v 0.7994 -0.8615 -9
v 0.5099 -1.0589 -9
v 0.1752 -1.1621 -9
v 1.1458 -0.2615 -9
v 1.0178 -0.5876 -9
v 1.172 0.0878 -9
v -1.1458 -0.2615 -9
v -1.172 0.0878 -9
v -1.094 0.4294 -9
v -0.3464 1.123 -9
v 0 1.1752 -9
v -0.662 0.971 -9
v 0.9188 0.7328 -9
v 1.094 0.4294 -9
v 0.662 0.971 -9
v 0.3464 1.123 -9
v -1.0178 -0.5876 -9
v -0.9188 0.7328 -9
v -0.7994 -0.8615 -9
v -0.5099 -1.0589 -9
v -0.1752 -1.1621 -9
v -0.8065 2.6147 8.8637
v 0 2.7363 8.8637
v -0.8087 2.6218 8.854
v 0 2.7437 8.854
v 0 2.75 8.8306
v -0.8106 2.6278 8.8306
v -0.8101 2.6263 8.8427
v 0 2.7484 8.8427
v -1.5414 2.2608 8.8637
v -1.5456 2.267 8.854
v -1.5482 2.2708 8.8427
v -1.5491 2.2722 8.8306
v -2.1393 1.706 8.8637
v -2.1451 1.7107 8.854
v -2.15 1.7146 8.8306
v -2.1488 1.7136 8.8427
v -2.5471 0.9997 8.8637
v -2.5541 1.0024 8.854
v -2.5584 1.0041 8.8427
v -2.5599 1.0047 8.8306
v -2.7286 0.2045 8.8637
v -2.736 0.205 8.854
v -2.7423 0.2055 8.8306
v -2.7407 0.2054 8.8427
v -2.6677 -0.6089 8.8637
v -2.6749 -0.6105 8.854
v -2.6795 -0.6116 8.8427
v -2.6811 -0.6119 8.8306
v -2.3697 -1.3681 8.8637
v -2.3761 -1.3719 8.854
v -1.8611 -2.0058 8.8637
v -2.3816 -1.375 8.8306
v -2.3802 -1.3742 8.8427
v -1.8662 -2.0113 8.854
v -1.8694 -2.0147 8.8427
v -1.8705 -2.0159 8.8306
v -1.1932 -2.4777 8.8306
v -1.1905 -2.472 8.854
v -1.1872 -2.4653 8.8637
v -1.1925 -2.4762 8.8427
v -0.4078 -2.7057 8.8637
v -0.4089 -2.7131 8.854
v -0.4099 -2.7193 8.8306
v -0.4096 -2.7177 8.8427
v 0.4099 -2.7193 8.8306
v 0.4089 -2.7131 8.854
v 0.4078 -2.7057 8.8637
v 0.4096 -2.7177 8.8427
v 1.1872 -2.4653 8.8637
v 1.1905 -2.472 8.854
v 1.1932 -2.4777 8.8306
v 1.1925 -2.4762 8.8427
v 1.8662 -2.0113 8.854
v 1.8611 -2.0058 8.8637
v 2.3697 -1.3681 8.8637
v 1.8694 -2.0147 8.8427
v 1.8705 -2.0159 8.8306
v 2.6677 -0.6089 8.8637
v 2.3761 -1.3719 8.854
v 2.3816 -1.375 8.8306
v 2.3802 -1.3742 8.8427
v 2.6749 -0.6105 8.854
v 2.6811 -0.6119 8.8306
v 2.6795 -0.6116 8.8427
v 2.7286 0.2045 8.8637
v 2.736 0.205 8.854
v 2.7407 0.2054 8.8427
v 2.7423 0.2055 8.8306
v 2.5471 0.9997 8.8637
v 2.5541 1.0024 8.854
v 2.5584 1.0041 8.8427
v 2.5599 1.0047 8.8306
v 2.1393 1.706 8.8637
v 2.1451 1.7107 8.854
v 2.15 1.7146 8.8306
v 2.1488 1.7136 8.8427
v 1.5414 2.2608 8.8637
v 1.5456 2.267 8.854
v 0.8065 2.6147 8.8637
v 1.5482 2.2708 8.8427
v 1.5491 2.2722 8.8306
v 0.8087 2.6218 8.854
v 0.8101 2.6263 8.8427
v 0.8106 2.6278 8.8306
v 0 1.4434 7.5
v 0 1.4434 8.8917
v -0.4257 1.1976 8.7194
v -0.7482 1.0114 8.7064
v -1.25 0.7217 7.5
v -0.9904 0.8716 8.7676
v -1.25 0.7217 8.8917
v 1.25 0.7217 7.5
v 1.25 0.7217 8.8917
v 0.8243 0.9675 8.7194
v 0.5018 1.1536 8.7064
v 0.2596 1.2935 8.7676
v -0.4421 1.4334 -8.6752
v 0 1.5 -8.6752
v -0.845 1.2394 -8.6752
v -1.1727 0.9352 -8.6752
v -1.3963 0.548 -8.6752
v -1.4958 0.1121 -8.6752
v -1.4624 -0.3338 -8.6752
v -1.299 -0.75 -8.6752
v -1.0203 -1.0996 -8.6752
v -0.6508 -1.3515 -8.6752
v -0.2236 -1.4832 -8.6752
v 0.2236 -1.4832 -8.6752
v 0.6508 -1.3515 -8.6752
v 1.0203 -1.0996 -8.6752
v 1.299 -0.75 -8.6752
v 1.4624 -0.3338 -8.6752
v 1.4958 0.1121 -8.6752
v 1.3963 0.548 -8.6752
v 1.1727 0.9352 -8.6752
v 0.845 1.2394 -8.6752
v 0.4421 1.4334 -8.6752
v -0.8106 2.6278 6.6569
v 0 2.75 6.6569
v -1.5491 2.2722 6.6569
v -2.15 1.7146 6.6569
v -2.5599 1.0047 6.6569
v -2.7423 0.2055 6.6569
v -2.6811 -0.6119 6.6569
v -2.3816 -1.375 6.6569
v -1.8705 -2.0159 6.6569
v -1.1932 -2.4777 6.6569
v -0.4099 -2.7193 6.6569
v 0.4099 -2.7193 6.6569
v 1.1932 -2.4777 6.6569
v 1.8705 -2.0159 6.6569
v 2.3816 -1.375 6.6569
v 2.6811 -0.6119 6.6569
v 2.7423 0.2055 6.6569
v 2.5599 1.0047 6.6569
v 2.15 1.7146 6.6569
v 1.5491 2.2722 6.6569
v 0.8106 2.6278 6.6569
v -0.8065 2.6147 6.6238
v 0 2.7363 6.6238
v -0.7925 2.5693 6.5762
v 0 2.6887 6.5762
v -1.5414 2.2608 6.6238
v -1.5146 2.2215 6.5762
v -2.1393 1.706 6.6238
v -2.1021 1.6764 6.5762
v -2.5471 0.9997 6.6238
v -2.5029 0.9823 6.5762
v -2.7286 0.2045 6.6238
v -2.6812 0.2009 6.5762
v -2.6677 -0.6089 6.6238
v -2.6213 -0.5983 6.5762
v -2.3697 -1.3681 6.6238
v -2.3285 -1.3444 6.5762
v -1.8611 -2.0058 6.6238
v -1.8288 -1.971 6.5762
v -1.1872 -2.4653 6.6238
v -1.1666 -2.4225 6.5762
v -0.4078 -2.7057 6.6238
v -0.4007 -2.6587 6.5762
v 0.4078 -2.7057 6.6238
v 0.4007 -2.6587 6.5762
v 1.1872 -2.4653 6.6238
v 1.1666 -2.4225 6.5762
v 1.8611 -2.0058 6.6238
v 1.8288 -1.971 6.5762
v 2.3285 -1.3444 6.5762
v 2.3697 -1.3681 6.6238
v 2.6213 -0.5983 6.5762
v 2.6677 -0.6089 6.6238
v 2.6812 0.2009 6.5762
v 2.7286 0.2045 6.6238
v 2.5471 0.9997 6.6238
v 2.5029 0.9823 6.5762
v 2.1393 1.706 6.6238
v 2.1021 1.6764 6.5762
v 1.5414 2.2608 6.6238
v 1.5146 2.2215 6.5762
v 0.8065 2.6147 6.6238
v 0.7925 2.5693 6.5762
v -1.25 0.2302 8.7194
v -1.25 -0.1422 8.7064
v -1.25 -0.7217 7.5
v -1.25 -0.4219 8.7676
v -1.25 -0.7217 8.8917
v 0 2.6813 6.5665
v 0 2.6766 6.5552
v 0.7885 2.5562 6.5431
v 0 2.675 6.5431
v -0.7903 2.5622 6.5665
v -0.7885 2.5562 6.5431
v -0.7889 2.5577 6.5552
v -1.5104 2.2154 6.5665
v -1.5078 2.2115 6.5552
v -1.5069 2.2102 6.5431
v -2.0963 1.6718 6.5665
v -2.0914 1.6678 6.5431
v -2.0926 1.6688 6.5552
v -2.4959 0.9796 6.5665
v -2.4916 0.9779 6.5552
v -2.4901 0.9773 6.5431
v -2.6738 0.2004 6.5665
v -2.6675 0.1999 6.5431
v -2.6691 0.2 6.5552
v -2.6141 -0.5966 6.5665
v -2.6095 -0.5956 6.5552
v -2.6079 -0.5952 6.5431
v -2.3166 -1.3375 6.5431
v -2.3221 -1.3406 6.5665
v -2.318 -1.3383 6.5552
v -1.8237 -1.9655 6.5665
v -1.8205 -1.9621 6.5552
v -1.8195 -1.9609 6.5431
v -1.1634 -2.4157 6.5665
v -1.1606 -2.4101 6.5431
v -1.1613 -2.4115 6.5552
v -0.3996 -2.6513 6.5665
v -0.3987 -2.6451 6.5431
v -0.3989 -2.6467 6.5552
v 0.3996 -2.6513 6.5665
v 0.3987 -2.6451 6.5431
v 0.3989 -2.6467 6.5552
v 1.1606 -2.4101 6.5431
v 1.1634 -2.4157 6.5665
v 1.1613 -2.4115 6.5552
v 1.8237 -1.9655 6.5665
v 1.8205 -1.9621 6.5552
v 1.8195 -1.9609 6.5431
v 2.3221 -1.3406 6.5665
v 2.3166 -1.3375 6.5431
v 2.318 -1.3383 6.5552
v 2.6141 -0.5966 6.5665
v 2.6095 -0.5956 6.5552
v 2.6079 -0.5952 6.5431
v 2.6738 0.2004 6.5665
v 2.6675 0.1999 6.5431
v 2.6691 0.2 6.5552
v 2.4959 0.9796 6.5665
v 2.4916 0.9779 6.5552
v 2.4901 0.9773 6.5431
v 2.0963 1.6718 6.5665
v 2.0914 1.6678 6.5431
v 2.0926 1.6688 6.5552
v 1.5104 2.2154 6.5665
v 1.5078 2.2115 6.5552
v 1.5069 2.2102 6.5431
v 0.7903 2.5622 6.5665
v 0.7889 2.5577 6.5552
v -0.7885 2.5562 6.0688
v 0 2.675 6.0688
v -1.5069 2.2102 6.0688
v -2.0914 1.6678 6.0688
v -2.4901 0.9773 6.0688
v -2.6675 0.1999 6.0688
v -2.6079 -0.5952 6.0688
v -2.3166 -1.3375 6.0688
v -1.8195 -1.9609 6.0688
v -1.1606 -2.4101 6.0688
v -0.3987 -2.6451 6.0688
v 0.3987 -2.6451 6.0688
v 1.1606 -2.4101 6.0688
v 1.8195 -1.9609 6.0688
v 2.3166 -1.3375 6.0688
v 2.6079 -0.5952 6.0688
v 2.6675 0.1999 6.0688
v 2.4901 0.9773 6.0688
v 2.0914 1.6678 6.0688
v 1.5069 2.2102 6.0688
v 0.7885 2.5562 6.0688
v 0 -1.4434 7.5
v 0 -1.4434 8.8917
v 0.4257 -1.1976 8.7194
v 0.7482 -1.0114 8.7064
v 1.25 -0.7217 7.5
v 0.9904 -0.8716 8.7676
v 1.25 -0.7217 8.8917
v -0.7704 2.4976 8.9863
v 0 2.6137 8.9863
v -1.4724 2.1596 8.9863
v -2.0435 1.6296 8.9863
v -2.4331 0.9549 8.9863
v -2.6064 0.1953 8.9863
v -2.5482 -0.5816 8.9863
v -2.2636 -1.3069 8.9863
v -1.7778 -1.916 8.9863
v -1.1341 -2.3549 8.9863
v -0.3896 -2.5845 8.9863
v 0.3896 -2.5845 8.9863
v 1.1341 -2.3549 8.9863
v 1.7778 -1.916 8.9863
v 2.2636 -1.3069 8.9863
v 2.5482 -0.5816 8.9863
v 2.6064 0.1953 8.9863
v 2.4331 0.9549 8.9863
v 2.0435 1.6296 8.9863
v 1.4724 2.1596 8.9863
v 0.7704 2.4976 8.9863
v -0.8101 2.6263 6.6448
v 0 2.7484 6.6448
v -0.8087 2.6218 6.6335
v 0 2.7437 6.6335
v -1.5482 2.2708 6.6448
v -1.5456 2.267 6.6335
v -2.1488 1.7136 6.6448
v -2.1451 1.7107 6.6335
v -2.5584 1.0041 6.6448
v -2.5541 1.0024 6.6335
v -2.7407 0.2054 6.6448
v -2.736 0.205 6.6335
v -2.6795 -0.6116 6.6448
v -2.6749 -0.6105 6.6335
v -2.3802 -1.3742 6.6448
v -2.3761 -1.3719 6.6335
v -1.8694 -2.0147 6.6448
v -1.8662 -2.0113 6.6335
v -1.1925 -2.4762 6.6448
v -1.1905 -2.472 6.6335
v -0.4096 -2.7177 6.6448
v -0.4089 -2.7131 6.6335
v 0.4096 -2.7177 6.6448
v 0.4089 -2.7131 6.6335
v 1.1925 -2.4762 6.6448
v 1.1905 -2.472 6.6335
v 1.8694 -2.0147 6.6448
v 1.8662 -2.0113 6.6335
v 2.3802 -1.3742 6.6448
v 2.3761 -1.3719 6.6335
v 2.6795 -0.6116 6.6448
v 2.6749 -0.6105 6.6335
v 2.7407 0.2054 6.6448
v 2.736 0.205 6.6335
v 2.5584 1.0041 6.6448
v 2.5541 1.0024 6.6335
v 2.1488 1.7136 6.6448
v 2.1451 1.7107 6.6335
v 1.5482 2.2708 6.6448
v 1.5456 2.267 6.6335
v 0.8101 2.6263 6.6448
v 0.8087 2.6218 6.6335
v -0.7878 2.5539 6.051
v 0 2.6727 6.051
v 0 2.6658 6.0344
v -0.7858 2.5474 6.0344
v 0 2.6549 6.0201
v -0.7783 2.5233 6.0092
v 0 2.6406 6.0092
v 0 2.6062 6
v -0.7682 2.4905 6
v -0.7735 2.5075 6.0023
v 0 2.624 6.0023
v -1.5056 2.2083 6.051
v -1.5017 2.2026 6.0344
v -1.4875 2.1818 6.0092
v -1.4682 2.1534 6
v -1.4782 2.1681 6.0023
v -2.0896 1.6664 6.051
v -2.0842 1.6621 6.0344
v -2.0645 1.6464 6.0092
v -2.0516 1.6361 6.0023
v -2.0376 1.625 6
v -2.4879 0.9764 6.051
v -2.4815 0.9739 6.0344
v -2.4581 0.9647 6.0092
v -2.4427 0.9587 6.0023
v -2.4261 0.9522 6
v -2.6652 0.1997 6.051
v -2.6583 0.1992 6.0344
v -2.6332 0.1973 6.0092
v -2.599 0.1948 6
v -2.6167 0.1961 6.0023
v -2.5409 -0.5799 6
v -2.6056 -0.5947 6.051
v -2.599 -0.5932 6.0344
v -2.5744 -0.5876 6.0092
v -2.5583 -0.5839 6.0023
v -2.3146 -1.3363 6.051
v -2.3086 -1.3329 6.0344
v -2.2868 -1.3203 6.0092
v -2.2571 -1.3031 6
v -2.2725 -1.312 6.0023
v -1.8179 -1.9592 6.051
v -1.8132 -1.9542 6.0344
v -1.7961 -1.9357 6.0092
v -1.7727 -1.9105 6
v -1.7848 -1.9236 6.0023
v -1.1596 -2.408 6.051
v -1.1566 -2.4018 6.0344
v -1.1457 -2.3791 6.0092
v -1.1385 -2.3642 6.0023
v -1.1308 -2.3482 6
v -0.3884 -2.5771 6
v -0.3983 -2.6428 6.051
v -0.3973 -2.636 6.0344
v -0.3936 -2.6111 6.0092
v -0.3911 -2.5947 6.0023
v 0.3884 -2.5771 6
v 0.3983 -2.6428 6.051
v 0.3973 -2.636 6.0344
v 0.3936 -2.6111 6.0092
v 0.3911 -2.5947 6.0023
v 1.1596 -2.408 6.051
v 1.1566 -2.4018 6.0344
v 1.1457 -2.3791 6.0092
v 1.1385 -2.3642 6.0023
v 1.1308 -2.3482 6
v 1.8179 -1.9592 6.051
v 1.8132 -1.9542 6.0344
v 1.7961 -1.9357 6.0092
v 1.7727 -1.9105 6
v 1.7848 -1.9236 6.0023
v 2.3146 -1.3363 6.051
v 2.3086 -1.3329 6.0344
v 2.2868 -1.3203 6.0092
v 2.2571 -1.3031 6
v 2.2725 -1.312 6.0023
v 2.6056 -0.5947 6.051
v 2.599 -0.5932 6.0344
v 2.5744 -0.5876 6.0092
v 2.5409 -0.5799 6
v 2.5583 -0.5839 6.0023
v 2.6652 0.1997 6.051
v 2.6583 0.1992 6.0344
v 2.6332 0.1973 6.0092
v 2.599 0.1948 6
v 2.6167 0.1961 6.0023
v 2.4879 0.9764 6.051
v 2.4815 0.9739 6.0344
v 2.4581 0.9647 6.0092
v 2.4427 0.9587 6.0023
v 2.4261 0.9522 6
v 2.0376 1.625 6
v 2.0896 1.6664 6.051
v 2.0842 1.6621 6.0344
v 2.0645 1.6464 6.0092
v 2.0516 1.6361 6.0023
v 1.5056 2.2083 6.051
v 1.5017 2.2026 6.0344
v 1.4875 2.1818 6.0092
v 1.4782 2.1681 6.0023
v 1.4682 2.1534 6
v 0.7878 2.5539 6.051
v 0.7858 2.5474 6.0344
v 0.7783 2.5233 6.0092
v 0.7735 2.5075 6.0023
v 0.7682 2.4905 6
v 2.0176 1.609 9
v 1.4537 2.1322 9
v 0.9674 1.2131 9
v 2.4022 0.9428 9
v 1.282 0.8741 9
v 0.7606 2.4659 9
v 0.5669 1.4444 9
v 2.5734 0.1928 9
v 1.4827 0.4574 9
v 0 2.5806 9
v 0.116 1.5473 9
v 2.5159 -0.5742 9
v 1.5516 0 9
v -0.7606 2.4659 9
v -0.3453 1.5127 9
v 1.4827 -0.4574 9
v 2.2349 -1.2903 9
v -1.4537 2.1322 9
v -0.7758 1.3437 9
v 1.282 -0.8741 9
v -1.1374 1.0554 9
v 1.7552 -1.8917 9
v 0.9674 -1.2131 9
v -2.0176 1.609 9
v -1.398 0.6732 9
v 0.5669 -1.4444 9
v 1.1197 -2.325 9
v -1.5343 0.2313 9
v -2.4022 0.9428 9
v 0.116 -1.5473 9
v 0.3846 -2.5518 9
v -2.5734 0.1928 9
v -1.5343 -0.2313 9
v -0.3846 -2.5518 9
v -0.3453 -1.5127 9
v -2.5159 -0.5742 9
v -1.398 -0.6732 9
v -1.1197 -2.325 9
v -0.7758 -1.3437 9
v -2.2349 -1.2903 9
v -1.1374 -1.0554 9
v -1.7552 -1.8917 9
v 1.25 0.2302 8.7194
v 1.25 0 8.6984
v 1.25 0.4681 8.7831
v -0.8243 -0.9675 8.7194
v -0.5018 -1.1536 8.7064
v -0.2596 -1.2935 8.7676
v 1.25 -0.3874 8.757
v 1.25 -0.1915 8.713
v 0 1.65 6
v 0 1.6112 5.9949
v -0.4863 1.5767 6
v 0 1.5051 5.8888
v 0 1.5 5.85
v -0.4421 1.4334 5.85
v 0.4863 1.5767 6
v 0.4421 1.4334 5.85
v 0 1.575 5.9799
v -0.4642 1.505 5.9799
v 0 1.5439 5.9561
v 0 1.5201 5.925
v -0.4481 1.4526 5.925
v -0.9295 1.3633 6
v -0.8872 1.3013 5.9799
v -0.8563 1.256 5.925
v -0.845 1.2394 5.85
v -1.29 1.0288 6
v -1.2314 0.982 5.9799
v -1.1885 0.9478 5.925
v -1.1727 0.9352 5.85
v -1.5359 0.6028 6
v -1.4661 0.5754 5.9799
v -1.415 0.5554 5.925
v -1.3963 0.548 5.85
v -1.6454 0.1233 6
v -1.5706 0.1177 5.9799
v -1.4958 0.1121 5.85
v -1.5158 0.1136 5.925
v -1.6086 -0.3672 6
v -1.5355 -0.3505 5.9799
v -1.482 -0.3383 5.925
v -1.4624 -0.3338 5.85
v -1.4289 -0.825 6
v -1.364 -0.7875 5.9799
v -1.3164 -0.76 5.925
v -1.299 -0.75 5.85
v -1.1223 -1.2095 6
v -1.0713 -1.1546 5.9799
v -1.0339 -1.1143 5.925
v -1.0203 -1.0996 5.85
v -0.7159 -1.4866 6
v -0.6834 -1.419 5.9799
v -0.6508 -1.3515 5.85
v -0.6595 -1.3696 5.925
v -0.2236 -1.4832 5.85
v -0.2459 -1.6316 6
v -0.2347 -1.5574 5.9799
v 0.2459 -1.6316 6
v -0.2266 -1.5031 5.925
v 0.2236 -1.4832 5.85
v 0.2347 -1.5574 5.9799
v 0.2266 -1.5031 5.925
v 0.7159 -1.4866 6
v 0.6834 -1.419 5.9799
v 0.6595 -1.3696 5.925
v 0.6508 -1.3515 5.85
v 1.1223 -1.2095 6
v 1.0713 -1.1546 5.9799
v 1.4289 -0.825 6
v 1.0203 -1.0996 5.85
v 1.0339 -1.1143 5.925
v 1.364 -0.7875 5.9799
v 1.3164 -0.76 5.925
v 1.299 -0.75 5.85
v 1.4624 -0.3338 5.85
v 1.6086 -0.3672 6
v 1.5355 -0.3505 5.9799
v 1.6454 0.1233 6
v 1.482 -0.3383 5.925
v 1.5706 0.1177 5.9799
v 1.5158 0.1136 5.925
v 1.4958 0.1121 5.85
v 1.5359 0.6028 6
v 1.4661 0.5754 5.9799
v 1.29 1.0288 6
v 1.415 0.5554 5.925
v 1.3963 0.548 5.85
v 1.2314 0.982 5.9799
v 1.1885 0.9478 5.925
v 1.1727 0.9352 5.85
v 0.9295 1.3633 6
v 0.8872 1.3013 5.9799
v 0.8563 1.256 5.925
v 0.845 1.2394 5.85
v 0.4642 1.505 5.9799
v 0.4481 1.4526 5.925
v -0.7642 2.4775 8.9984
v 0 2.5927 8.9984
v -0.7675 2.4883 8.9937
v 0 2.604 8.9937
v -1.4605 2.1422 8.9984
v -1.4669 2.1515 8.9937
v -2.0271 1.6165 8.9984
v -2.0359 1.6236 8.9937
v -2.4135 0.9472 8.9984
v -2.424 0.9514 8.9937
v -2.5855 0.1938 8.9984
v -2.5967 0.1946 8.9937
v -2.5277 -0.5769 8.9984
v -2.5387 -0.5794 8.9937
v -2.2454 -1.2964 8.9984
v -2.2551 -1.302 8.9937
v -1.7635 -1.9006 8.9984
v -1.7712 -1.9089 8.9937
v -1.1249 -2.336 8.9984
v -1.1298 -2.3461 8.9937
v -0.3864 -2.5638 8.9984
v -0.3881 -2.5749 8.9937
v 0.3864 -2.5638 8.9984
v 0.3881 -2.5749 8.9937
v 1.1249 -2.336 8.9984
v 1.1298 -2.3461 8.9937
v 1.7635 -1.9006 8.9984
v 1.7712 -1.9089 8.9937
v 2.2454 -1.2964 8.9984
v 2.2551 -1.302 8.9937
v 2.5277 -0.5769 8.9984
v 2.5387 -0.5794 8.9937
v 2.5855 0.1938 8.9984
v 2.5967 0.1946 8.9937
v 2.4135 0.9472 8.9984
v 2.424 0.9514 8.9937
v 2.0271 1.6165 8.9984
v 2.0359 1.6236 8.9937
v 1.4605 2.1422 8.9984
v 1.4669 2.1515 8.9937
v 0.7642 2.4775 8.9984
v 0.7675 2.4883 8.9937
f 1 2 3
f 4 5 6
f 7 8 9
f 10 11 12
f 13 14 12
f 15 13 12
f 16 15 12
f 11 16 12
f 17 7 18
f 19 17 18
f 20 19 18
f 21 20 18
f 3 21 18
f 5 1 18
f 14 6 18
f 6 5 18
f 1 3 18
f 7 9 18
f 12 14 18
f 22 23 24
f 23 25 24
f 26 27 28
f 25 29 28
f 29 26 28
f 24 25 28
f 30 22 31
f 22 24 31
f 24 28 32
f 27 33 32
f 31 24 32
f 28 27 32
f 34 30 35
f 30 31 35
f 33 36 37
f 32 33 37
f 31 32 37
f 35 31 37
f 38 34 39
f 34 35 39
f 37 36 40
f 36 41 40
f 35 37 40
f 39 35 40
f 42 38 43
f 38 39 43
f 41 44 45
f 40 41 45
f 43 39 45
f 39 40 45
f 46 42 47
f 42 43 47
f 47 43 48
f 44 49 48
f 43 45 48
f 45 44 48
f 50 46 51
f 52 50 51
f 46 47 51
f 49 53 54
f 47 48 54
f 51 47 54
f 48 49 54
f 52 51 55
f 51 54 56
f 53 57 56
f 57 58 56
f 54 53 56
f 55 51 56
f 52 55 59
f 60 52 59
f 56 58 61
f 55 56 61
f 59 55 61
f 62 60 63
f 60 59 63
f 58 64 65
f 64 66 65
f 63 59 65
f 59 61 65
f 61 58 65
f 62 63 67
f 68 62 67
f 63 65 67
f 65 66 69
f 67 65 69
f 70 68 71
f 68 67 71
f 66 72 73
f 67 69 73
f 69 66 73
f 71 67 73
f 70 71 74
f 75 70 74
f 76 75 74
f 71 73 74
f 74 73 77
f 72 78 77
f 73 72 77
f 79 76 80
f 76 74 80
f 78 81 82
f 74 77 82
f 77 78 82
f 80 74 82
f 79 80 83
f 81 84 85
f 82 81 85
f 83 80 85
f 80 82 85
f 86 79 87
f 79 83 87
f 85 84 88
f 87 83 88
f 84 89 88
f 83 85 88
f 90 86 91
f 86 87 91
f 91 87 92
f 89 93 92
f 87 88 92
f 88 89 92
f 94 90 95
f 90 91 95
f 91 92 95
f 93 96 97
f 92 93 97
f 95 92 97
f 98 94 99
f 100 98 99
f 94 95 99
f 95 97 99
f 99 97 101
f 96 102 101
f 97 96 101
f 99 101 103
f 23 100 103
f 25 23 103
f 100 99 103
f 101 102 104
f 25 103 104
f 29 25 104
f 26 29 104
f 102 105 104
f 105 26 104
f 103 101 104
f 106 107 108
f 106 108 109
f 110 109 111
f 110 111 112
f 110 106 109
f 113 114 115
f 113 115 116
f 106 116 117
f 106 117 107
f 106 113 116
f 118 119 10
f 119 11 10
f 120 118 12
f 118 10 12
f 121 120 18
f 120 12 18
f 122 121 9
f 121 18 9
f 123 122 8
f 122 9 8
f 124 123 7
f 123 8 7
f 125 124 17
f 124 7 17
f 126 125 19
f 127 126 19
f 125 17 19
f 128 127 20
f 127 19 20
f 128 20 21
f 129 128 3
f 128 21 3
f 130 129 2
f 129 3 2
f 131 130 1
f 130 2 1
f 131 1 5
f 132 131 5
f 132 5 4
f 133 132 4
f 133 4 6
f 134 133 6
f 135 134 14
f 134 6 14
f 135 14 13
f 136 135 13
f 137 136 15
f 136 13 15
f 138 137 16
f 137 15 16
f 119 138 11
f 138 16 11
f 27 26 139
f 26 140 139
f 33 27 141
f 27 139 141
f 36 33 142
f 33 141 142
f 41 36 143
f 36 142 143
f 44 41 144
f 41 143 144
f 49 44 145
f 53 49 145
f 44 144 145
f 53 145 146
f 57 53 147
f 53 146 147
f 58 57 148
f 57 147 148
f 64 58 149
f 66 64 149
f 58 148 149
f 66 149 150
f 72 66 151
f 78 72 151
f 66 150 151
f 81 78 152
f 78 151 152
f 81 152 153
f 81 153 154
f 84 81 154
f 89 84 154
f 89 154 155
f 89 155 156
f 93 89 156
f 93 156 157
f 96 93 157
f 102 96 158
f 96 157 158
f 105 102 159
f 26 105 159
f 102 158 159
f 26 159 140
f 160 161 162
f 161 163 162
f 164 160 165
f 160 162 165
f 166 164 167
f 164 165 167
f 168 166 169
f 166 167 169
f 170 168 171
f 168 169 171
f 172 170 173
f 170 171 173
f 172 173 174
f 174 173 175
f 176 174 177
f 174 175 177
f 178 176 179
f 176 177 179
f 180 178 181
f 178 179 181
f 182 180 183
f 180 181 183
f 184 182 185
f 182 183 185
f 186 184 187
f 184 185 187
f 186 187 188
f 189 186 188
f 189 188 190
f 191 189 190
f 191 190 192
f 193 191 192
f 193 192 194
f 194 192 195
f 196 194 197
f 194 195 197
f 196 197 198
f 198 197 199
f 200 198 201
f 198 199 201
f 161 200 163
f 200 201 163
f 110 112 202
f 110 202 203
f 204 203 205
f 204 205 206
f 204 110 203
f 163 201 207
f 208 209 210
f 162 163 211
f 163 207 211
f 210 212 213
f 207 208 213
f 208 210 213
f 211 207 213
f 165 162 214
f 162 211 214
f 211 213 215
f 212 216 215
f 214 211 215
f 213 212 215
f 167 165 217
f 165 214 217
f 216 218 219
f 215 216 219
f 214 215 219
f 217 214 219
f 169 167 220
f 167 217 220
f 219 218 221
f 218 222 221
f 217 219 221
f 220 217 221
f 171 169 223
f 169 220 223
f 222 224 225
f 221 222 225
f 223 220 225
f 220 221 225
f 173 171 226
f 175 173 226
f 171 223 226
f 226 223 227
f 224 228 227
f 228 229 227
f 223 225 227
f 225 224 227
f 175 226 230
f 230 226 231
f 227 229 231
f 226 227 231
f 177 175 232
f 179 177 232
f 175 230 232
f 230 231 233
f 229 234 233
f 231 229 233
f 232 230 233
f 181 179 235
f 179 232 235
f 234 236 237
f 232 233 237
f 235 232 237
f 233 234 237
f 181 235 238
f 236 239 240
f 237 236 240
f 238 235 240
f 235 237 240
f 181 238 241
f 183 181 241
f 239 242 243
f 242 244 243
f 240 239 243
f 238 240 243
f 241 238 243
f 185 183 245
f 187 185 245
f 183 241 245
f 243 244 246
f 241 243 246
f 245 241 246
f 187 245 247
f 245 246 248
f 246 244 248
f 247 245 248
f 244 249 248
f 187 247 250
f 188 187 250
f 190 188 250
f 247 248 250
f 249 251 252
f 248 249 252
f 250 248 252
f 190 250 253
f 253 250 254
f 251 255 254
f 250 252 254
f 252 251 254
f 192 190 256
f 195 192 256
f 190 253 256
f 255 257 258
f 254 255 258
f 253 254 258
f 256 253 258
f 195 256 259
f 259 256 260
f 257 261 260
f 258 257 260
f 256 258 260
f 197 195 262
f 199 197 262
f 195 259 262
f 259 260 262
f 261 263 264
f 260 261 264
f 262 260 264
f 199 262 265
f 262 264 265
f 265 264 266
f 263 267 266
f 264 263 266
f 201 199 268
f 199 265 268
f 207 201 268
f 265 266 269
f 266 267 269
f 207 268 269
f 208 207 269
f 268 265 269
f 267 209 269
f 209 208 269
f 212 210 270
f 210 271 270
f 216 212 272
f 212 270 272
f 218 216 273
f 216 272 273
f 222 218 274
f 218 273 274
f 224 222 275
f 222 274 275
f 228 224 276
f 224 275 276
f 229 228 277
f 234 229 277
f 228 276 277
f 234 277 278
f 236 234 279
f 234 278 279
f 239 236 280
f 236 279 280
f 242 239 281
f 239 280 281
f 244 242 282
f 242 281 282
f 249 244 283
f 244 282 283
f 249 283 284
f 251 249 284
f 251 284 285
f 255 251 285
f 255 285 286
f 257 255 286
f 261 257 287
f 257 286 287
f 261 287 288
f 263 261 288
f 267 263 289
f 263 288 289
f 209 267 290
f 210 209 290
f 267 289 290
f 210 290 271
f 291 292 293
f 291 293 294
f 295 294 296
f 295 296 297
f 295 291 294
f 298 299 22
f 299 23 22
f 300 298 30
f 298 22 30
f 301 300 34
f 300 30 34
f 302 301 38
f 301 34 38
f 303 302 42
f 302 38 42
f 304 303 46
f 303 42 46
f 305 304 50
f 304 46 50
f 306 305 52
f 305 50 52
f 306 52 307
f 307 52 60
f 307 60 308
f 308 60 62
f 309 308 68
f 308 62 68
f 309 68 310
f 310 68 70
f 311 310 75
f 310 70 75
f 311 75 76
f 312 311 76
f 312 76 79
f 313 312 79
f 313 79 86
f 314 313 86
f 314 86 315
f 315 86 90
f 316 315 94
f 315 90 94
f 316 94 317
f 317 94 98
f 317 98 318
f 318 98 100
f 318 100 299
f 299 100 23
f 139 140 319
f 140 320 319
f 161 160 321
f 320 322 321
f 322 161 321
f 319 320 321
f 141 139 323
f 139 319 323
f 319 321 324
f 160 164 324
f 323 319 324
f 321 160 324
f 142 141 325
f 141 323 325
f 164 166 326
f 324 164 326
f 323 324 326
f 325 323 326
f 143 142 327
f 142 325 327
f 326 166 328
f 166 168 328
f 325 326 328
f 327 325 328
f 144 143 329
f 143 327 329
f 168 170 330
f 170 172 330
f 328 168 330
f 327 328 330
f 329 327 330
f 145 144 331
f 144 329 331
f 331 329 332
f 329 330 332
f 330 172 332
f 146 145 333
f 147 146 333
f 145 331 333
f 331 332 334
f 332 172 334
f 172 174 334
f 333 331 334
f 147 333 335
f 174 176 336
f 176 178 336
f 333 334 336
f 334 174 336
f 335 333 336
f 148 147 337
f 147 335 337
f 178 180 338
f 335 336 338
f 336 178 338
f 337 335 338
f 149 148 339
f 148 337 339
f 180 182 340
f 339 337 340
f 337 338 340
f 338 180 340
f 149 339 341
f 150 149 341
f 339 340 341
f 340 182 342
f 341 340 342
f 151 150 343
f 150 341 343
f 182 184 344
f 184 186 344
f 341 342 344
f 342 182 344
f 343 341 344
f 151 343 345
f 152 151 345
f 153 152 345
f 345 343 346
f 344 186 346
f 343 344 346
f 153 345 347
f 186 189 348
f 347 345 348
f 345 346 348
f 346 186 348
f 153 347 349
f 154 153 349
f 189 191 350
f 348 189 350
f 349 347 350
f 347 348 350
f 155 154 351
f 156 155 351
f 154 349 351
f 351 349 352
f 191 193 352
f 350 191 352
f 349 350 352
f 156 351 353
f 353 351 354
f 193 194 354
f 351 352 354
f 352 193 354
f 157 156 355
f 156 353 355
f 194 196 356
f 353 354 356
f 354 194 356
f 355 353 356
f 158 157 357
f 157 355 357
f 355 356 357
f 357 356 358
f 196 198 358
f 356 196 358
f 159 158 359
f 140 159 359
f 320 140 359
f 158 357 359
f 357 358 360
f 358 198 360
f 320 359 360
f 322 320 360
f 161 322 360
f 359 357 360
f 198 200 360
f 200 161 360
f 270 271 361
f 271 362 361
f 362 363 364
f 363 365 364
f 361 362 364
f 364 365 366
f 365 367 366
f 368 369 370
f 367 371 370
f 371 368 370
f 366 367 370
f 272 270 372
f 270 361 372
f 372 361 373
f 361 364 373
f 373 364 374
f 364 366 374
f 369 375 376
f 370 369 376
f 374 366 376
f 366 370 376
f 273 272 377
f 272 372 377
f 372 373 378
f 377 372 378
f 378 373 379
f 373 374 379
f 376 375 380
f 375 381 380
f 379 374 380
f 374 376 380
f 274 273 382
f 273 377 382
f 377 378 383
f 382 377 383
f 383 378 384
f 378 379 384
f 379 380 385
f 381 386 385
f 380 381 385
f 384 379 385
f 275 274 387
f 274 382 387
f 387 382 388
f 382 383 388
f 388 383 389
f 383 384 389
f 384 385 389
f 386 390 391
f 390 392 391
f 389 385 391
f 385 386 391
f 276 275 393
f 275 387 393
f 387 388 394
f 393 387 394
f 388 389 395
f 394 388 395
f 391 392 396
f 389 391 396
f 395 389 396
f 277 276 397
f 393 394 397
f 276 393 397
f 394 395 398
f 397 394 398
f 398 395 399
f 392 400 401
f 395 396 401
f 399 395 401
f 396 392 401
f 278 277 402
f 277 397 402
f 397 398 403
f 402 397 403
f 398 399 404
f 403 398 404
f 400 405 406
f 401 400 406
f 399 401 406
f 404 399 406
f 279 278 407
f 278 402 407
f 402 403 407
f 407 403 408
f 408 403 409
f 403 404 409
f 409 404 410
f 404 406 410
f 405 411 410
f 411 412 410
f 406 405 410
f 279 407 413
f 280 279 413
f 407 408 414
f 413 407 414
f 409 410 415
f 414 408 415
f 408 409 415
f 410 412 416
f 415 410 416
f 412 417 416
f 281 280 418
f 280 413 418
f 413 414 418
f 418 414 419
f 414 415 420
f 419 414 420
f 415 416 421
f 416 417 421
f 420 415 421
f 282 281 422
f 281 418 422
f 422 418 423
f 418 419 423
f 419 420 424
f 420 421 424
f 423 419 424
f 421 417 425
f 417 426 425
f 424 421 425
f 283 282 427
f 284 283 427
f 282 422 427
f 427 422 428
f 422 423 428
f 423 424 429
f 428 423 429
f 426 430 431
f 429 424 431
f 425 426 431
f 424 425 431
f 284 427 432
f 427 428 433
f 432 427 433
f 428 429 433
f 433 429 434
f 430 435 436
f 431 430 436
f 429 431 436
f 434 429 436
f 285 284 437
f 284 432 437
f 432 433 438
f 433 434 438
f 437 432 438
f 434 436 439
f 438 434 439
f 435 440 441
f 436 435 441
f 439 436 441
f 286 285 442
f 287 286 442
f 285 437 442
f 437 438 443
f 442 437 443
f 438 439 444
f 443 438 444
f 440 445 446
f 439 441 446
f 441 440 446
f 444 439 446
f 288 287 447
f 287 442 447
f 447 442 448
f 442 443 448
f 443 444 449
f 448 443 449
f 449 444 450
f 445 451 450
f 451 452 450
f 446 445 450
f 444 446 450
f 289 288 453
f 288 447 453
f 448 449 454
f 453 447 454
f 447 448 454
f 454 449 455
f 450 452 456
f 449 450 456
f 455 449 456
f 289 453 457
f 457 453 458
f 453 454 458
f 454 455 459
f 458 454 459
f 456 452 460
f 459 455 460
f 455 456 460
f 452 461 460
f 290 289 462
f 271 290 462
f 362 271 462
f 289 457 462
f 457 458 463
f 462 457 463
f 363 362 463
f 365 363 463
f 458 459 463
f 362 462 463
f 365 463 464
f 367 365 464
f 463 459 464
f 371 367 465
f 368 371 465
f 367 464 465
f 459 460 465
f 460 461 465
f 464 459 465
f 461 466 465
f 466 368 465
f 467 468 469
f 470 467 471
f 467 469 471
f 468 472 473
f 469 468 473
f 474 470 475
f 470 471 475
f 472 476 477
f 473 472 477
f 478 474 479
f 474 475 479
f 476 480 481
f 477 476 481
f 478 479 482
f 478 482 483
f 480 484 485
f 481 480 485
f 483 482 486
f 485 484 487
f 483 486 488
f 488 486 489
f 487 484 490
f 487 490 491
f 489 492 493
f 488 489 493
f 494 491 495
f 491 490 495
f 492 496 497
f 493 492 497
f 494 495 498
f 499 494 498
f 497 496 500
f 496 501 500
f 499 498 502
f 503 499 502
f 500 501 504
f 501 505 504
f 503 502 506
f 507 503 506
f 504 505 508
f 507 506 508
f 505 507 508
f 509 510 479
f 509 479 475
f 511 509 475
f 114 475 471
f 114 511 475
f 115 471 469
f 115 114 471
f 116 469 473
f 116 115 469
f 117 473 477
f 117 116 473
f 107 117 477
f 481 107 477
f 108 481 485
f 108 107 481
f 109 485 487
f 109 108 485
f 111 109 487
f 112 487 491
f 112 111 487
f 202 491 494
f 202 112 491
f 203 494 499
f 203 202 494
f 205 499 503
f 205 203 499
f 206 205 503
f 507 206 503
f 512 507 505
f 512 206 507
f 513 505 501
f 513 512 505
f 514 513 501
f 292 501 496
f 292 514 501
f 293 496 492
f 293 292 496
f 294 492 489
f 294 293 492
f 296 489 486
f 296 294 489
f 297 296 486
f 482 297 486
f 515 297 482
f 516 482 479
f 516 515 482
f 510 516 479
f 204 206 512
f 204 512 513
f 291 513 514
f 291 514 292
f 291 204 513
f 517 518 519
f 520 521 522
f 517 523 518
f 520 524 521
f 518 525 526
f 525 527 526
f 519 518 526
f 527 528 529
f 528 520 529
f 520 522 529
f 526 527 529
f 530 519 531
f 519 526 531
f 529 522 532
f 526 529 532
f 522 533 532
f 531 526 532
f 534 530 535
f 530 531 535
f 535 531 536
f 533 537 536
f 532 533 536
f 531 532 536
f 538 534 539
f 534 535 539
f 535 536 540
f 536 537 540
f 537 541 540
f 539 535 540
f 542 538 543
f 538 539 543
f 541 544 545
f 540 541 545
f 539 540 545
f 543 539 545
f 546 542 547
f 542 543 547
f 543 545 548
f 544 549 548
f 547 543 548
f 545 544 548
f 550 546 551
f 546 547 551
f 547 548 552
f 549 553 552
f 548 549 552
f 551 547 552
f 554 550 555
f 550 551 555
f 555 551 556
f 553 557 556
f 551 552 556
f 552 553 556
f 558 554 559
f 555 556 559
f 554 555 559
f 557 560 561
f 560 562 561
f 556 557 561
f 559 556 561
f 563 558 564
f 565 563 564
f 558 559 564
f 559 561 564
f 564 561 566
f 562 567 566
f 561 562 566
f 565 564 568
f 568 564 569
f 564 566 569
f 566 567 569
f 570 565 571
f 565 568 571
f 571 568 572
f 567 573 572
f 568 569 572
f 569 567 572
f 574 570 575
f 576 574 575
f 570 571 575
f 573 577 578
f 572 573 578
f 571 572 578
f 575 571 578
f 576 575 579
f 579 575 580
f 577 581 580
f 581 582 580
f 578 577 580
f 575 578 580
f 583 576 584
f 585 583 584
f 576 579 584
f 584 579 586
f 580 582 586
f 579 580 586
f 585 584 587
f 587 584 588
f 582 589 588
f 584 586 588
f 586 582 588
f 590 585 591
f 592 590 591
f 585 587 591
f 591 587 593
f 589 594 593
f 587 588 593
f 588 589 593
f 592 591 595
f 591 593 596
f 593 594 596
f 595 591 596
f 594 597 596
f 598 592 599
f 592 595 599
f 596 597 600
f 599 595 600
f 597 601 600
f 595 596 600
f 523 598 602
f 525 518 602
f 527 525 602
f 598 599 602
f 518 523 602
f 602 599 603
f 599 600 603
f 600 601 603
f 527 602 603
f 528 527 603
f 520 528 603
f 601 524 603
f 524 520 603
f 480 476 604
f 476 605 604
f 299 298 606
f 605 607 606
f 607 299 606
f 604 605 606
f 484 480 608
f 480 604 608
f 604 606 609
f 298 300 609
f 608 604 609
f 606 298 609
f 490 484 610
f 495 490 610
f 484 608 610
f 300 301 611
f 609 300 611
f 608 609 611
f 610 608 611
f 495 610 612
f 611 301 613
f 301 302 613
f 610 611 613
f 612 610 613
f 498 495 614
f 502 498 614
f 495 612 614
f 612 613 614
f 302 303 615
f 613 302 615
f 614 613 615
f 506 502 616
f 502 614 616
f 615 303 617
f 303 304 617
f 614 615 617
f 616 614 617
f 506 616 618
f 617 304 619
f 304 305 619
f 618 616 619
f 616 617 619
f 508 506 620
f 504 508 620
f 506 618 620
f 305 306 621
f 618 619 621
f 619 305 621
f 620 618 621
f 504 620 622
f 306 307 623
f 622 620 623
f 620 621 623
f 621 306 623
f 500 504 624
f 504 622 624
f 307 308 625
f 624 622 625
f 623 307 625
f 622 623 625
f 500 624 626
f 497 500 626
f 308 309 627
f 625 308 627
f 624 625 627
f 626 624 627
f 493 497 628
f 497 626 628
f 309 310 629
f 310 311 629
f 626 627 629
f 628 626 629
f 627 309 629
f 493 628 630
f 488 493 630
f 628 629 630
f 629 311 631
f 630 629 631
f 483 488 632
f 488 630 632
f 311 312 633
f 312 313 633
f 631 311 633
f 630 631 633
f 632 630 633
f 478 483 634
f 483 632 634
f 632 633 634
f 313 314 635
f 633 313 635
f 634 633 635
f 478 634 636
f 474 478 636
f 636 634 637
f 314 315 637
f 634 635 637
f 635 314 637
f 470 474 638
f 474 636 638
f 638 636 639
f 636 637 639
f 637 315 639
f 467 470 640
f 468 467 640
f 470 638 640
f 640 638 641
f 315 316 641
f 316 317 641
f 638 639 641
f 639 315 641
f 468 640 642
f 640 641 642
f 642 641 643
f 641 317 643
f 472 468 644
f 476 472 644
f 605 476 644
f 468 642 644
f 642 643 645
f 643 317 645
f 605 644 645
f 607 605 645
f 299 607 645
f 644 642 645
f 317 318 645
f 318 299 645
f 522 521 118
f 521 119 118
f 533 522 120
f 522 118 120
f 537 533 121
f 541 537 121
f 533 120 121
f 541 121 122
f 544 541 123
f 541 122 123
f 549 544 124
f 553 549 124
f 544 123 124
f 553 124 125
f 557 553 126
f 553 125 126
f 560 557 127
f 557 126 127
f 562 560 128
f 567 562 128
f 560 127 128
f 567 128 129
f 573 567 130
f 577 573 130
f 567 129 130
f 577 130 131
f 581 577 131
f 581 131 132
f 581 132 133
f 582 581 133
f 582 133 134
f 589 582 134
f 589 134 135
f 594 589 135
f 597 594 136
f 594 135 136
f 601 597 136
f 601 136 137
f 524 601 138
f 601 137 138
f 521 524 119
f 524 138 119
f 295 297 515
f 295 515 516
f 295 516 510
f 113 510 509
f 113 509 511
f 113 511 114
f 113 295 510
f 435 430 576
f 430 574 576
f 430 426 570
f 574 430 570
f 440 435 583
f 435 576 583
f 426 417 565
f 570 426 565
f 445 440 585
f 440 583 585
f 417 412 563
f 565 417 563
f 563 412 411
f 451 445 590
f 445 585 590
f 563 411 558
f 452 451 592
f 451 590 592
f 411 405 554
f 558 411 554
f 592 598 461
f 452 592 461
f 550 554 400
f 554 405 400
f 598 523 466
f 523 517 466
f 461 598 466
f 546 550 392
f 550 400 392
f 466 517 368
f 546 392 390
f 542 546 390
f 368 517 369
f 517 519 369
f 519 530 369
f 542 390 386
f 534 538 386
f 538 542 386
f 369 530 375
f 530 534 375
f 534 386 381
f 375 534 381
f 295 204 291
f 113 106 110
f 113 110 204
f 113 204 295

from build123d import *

# Parameters (mm, degrees)
CUT_EXTRUDE1_START = -1.5
CUT_EXTRUDE1_DEPTH = 1.5
SKETCH4_R          = 1.551628848
CUT_EXTRUDE2_DEPTH = 1.5
CUT_EXTRUDE2_TAPER = 45


with BuildPart() as part:
    # Sketch2 → Revolve1 (revolve)
    with BuildSketch(Plane(origin=(0, 0, 0), x_dir=(0, 0, -1), z_dir=(1, 0, 0))):
        with BuildLine():
            Line((-9, 0), (-9, 2.580583739))
            ThreePointArc((-9, 2.580583739), (-8.996431853, 2.598522025), (-8.98627063, 2.61372937))
            Line((-8.98627063, 2.61372937), (-8.86372937, 2.73627063))
            ThreePointArc((-8.86372937, 2.73627063), (-8.848522025, 2.746431853), (-8.830583739, 2.75))
            Line((-8.830583739, 2.75), (-6.656916261, 2.75))
            ThreePointArc((-6.656916261, 2.75), (-6.638977975, 2.746431853), (-6.62377063, 2.73627063))
            Line((-6.62377063, 2.73627063), (-6.57622937, 2.68872937))
            ThreePointArc((-6.57622937, 2.68872937), (-6.561022025, 2.678568147), (-6.543083739, 2.675))
            Line((-6.543083739, 2.675), (-6.06875, 2.675))
            ThreePointArc((-6.06875, 2.675), (-6.020136409, 2.654863591), (-6, 2.60625))
            Line((-6, 2.60625), (-6, 1.65))
            ThreePointArc((-6, 1.65), (-5.956066017, 1.543933983), (-5.85, 1.5))
            Line((-5.85, 1.5), (8.675240474, 1.5))
            Line((8.675240474, 1.5), (9, 1.175240474))
            Line((9, 1.175240474), (9, 0))
            Line((9, 0), (-9, 0))
        make_face()
    revolve(axis=Axis((0, 0, -9), (0, 0, 1)))

    # Sketch3 → Cut-Extrude1 (cut)
    with BuildSketch(Plane.XY.offset(9).offset(CUT_EXTRUDE1_START)):
        Polygon((1.25, -0.721687836), (1.25, 0.721687836), (0, 1.443375673), (-1.25, 0.721687836), (-1.25, -0.721687836), (0, -1.443375673), align=None)
    extrude(amount=CUT_EXTRUDE1_DEPTH, mode=Mode.SUBTRACT)

    # Sketch4 → Cut-Extrude2 (cut)
    with BuildSketch(Plane.XY.offset(9)):
        Circle(SKETCH4_R)
    extrude(amount=-CUT_EXTRUDE2_DEPTH, taper=CUT_EXTRUDE2_TAPER, mode=Mode.SUBTRACT)


solid = part.part
